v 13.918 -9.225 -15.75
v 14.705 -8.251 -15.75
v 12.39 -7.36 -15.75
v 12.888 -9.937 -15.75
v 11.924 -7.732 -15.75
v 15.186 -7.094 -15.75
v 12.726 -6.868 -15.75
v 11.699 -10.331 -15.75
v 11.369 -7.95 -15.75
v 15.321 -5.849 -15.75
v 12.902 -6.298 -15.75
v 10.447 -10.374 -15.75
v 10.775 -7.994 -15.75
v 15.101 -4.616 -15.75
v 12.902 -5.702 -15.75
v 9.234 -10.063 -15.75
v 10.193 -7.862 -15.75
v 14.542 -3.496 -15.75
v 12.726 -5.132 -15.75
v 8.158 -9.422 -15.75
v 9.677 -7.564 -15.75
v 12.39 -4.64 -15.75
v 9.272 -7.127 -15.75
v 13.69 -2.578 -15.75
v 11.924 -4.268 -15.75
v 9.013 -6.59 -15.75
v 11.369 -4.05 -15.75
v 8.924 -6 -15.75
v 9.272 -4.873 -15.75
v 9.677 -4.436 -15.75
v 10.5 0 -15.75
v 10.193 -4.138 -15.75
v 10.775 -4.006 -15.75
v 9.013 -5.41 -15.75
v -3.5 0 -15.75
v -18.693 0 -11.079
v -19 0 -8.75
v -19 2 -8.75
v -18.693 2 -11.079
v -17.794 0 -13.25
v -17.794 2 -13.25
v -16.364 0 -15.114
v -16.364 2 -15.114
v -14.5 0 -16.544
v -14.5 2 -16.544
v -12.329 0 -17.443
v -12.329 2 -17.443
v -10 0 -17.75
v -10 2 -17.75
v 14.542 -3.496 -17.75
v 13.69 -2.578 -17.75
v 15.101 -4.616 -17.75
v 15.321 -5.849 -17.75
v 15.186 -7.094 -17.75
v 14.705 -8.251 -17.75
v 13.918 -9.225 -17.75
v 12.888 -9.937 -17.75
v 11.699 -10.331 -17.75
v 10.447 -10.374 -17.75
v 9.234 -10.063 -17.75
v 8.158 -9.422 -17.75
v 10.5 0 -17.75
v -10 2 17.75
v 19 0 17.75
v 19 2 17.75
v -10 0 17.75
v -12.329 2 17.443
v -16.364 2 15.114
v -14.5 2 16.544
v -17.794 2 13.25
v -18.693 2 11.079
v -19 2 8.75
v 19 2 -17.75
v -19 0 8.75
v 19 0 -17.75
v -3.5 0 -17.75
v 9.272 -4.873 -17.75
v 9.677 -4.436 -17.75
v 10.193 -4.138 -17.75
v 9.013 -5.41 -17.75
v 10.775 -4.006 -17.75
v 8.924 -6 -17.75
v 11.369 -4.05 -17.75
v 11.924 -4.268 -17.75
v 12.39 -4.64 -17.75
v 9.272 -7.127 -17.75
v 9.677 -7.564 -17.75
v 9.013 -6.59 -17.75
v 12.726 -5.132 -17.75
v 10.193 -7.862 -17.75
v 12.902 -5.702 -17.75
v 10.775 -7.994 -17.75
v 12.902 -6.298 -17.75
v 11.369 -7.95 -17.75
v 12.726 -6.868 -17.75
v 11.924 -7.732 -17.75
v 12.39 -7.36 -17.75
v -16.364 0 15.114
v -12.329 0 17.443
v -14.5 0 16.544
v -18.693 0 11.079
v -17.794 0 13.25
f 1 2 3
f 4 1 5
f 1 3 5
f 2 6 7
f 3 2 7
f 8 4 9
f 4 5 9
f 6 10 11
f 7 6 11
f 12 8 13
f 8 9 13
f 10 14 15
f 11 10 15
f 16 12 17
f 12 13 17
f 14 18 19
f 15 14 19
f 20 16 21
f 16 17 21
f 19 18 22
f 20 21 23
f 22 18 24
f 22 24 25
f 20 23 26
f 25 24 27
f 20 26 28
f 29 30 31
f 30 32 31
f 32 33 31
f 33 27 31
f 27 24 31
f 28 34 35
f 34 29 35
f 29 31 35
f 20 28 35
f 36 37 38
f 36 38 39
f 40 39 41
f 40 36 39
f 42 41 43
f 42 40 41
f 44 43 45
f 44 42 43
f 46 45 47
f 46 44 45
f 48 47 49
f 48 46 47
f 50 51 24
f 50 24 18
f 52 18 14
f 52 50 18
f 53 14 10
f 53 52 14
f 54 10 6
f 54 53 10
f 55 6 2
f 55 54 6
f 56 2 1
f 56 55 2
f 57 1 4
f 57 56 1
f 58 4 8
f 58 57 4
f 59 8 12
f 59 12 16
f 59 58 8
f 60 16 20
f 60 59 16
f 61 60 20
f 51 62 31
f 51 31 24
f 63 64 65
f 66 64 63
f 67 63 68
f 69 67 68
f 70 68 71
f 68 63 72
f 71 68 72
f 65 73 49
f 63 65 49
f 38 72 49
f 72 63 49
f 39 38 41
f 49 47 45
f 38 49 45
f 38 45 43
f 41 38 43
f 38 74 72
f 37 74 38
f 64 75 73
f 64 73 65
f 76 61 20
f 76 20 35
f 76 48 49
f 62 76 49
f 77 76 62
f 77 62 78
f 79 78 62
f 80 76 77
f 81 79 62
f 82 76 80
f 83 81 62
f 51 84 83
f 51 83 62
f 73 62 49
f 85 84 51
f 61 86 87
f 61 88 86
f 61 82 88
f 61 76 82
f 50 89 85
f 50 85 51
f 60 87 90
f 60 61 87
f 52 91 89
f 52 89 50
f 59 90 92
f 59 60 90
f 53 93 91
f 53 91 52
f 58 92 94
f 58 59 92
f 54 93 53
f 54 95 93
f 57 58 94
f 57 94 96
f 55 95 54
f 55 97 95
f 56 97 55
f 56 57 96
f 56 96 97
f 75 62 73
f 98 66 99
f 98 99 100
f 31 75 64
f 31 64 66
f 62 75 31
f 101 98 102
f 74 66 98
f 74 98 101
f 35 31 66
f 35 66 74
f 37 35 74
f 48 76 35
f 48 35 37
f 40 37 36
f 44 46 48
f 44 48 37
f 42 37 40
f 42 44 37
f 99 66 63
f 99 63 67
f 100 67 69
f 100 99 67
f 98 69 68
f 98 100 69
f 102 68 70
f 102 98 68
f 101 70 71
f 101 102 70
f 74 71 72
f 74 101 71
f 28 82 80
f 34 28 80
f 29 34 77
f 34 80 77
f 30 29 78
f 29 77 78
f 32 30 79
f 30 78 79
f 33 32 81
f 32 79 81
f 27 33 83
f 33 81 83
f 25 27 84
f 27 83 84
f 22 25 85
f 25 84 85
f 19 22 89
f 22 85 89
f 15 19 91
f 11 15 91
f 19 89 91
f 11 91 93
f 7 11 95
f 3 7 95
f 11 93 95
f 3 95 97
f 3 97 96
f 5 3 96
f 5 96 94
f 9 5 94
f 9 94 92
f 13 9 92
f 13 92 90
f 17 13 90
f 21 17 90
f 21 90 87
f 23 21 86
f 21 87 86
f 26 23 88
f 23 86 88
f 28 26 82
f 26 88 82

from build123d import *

# Parameters (mm, degrees)
BOSS_EXTRUDE1_DEPTH = 2
SKETCH2_R           = 2
BOSS_EXTRUDE2_DEPTH = 2


with BuildPart() as part:
    # Sketch1 → Boss-Extrude1 (new body)
    with BuildSketch(Plane(origin=(0, 0, 0), x_dir=(1, 0, 0), z_dir=(0, 1, 0))):
        with BuildLine():
            Line((-10, 17.75), (19, 17.75))
            Line((19, 17.75), (19, -17.75))
            Line((19, -17.75), (-10, -17.75))
            ThreePointArc((-10, -17.75), (-16.363961031, -15.113961031), (-19, -8.75))
            Line((-19, -8.75), (-19, 8.75))
            ThreePointArc((-19, 8.75), (-16.363961031, 15.113961031), (-10, 17.75))
        make_face()
    extrude(amount=BOSS_EXTRUDE1_DEPTH)

    # Sketch2 → Boss-Extrude2 (add)
    with BuildSketch(Plane(origin=(0, 0, -17.75), x_dir=(-1, 0, 0), z_dir=(0, 0, -1))):
        with BuildLine():
            Line((-10.5, 0), (-13.689709334, -2.577891806))
            ThreePointArc((-13.689709334, -2.577891806), (-14.346103242, -8.765714286), (-8.158280763, -9.422108194))
            Line((-8.158280763, -9.422108194), (3.5, 0))
            Line((3.5, 0), (-10.5, 0))
        make_face()
        with Locations((-10.923995048, -6)):
            Circle(SKETCH2_R, mode=Mode.SUBTRACT)
    extrude(amount=-BOSS_EXTRUDE2_DEPTH)


solid = part.part
